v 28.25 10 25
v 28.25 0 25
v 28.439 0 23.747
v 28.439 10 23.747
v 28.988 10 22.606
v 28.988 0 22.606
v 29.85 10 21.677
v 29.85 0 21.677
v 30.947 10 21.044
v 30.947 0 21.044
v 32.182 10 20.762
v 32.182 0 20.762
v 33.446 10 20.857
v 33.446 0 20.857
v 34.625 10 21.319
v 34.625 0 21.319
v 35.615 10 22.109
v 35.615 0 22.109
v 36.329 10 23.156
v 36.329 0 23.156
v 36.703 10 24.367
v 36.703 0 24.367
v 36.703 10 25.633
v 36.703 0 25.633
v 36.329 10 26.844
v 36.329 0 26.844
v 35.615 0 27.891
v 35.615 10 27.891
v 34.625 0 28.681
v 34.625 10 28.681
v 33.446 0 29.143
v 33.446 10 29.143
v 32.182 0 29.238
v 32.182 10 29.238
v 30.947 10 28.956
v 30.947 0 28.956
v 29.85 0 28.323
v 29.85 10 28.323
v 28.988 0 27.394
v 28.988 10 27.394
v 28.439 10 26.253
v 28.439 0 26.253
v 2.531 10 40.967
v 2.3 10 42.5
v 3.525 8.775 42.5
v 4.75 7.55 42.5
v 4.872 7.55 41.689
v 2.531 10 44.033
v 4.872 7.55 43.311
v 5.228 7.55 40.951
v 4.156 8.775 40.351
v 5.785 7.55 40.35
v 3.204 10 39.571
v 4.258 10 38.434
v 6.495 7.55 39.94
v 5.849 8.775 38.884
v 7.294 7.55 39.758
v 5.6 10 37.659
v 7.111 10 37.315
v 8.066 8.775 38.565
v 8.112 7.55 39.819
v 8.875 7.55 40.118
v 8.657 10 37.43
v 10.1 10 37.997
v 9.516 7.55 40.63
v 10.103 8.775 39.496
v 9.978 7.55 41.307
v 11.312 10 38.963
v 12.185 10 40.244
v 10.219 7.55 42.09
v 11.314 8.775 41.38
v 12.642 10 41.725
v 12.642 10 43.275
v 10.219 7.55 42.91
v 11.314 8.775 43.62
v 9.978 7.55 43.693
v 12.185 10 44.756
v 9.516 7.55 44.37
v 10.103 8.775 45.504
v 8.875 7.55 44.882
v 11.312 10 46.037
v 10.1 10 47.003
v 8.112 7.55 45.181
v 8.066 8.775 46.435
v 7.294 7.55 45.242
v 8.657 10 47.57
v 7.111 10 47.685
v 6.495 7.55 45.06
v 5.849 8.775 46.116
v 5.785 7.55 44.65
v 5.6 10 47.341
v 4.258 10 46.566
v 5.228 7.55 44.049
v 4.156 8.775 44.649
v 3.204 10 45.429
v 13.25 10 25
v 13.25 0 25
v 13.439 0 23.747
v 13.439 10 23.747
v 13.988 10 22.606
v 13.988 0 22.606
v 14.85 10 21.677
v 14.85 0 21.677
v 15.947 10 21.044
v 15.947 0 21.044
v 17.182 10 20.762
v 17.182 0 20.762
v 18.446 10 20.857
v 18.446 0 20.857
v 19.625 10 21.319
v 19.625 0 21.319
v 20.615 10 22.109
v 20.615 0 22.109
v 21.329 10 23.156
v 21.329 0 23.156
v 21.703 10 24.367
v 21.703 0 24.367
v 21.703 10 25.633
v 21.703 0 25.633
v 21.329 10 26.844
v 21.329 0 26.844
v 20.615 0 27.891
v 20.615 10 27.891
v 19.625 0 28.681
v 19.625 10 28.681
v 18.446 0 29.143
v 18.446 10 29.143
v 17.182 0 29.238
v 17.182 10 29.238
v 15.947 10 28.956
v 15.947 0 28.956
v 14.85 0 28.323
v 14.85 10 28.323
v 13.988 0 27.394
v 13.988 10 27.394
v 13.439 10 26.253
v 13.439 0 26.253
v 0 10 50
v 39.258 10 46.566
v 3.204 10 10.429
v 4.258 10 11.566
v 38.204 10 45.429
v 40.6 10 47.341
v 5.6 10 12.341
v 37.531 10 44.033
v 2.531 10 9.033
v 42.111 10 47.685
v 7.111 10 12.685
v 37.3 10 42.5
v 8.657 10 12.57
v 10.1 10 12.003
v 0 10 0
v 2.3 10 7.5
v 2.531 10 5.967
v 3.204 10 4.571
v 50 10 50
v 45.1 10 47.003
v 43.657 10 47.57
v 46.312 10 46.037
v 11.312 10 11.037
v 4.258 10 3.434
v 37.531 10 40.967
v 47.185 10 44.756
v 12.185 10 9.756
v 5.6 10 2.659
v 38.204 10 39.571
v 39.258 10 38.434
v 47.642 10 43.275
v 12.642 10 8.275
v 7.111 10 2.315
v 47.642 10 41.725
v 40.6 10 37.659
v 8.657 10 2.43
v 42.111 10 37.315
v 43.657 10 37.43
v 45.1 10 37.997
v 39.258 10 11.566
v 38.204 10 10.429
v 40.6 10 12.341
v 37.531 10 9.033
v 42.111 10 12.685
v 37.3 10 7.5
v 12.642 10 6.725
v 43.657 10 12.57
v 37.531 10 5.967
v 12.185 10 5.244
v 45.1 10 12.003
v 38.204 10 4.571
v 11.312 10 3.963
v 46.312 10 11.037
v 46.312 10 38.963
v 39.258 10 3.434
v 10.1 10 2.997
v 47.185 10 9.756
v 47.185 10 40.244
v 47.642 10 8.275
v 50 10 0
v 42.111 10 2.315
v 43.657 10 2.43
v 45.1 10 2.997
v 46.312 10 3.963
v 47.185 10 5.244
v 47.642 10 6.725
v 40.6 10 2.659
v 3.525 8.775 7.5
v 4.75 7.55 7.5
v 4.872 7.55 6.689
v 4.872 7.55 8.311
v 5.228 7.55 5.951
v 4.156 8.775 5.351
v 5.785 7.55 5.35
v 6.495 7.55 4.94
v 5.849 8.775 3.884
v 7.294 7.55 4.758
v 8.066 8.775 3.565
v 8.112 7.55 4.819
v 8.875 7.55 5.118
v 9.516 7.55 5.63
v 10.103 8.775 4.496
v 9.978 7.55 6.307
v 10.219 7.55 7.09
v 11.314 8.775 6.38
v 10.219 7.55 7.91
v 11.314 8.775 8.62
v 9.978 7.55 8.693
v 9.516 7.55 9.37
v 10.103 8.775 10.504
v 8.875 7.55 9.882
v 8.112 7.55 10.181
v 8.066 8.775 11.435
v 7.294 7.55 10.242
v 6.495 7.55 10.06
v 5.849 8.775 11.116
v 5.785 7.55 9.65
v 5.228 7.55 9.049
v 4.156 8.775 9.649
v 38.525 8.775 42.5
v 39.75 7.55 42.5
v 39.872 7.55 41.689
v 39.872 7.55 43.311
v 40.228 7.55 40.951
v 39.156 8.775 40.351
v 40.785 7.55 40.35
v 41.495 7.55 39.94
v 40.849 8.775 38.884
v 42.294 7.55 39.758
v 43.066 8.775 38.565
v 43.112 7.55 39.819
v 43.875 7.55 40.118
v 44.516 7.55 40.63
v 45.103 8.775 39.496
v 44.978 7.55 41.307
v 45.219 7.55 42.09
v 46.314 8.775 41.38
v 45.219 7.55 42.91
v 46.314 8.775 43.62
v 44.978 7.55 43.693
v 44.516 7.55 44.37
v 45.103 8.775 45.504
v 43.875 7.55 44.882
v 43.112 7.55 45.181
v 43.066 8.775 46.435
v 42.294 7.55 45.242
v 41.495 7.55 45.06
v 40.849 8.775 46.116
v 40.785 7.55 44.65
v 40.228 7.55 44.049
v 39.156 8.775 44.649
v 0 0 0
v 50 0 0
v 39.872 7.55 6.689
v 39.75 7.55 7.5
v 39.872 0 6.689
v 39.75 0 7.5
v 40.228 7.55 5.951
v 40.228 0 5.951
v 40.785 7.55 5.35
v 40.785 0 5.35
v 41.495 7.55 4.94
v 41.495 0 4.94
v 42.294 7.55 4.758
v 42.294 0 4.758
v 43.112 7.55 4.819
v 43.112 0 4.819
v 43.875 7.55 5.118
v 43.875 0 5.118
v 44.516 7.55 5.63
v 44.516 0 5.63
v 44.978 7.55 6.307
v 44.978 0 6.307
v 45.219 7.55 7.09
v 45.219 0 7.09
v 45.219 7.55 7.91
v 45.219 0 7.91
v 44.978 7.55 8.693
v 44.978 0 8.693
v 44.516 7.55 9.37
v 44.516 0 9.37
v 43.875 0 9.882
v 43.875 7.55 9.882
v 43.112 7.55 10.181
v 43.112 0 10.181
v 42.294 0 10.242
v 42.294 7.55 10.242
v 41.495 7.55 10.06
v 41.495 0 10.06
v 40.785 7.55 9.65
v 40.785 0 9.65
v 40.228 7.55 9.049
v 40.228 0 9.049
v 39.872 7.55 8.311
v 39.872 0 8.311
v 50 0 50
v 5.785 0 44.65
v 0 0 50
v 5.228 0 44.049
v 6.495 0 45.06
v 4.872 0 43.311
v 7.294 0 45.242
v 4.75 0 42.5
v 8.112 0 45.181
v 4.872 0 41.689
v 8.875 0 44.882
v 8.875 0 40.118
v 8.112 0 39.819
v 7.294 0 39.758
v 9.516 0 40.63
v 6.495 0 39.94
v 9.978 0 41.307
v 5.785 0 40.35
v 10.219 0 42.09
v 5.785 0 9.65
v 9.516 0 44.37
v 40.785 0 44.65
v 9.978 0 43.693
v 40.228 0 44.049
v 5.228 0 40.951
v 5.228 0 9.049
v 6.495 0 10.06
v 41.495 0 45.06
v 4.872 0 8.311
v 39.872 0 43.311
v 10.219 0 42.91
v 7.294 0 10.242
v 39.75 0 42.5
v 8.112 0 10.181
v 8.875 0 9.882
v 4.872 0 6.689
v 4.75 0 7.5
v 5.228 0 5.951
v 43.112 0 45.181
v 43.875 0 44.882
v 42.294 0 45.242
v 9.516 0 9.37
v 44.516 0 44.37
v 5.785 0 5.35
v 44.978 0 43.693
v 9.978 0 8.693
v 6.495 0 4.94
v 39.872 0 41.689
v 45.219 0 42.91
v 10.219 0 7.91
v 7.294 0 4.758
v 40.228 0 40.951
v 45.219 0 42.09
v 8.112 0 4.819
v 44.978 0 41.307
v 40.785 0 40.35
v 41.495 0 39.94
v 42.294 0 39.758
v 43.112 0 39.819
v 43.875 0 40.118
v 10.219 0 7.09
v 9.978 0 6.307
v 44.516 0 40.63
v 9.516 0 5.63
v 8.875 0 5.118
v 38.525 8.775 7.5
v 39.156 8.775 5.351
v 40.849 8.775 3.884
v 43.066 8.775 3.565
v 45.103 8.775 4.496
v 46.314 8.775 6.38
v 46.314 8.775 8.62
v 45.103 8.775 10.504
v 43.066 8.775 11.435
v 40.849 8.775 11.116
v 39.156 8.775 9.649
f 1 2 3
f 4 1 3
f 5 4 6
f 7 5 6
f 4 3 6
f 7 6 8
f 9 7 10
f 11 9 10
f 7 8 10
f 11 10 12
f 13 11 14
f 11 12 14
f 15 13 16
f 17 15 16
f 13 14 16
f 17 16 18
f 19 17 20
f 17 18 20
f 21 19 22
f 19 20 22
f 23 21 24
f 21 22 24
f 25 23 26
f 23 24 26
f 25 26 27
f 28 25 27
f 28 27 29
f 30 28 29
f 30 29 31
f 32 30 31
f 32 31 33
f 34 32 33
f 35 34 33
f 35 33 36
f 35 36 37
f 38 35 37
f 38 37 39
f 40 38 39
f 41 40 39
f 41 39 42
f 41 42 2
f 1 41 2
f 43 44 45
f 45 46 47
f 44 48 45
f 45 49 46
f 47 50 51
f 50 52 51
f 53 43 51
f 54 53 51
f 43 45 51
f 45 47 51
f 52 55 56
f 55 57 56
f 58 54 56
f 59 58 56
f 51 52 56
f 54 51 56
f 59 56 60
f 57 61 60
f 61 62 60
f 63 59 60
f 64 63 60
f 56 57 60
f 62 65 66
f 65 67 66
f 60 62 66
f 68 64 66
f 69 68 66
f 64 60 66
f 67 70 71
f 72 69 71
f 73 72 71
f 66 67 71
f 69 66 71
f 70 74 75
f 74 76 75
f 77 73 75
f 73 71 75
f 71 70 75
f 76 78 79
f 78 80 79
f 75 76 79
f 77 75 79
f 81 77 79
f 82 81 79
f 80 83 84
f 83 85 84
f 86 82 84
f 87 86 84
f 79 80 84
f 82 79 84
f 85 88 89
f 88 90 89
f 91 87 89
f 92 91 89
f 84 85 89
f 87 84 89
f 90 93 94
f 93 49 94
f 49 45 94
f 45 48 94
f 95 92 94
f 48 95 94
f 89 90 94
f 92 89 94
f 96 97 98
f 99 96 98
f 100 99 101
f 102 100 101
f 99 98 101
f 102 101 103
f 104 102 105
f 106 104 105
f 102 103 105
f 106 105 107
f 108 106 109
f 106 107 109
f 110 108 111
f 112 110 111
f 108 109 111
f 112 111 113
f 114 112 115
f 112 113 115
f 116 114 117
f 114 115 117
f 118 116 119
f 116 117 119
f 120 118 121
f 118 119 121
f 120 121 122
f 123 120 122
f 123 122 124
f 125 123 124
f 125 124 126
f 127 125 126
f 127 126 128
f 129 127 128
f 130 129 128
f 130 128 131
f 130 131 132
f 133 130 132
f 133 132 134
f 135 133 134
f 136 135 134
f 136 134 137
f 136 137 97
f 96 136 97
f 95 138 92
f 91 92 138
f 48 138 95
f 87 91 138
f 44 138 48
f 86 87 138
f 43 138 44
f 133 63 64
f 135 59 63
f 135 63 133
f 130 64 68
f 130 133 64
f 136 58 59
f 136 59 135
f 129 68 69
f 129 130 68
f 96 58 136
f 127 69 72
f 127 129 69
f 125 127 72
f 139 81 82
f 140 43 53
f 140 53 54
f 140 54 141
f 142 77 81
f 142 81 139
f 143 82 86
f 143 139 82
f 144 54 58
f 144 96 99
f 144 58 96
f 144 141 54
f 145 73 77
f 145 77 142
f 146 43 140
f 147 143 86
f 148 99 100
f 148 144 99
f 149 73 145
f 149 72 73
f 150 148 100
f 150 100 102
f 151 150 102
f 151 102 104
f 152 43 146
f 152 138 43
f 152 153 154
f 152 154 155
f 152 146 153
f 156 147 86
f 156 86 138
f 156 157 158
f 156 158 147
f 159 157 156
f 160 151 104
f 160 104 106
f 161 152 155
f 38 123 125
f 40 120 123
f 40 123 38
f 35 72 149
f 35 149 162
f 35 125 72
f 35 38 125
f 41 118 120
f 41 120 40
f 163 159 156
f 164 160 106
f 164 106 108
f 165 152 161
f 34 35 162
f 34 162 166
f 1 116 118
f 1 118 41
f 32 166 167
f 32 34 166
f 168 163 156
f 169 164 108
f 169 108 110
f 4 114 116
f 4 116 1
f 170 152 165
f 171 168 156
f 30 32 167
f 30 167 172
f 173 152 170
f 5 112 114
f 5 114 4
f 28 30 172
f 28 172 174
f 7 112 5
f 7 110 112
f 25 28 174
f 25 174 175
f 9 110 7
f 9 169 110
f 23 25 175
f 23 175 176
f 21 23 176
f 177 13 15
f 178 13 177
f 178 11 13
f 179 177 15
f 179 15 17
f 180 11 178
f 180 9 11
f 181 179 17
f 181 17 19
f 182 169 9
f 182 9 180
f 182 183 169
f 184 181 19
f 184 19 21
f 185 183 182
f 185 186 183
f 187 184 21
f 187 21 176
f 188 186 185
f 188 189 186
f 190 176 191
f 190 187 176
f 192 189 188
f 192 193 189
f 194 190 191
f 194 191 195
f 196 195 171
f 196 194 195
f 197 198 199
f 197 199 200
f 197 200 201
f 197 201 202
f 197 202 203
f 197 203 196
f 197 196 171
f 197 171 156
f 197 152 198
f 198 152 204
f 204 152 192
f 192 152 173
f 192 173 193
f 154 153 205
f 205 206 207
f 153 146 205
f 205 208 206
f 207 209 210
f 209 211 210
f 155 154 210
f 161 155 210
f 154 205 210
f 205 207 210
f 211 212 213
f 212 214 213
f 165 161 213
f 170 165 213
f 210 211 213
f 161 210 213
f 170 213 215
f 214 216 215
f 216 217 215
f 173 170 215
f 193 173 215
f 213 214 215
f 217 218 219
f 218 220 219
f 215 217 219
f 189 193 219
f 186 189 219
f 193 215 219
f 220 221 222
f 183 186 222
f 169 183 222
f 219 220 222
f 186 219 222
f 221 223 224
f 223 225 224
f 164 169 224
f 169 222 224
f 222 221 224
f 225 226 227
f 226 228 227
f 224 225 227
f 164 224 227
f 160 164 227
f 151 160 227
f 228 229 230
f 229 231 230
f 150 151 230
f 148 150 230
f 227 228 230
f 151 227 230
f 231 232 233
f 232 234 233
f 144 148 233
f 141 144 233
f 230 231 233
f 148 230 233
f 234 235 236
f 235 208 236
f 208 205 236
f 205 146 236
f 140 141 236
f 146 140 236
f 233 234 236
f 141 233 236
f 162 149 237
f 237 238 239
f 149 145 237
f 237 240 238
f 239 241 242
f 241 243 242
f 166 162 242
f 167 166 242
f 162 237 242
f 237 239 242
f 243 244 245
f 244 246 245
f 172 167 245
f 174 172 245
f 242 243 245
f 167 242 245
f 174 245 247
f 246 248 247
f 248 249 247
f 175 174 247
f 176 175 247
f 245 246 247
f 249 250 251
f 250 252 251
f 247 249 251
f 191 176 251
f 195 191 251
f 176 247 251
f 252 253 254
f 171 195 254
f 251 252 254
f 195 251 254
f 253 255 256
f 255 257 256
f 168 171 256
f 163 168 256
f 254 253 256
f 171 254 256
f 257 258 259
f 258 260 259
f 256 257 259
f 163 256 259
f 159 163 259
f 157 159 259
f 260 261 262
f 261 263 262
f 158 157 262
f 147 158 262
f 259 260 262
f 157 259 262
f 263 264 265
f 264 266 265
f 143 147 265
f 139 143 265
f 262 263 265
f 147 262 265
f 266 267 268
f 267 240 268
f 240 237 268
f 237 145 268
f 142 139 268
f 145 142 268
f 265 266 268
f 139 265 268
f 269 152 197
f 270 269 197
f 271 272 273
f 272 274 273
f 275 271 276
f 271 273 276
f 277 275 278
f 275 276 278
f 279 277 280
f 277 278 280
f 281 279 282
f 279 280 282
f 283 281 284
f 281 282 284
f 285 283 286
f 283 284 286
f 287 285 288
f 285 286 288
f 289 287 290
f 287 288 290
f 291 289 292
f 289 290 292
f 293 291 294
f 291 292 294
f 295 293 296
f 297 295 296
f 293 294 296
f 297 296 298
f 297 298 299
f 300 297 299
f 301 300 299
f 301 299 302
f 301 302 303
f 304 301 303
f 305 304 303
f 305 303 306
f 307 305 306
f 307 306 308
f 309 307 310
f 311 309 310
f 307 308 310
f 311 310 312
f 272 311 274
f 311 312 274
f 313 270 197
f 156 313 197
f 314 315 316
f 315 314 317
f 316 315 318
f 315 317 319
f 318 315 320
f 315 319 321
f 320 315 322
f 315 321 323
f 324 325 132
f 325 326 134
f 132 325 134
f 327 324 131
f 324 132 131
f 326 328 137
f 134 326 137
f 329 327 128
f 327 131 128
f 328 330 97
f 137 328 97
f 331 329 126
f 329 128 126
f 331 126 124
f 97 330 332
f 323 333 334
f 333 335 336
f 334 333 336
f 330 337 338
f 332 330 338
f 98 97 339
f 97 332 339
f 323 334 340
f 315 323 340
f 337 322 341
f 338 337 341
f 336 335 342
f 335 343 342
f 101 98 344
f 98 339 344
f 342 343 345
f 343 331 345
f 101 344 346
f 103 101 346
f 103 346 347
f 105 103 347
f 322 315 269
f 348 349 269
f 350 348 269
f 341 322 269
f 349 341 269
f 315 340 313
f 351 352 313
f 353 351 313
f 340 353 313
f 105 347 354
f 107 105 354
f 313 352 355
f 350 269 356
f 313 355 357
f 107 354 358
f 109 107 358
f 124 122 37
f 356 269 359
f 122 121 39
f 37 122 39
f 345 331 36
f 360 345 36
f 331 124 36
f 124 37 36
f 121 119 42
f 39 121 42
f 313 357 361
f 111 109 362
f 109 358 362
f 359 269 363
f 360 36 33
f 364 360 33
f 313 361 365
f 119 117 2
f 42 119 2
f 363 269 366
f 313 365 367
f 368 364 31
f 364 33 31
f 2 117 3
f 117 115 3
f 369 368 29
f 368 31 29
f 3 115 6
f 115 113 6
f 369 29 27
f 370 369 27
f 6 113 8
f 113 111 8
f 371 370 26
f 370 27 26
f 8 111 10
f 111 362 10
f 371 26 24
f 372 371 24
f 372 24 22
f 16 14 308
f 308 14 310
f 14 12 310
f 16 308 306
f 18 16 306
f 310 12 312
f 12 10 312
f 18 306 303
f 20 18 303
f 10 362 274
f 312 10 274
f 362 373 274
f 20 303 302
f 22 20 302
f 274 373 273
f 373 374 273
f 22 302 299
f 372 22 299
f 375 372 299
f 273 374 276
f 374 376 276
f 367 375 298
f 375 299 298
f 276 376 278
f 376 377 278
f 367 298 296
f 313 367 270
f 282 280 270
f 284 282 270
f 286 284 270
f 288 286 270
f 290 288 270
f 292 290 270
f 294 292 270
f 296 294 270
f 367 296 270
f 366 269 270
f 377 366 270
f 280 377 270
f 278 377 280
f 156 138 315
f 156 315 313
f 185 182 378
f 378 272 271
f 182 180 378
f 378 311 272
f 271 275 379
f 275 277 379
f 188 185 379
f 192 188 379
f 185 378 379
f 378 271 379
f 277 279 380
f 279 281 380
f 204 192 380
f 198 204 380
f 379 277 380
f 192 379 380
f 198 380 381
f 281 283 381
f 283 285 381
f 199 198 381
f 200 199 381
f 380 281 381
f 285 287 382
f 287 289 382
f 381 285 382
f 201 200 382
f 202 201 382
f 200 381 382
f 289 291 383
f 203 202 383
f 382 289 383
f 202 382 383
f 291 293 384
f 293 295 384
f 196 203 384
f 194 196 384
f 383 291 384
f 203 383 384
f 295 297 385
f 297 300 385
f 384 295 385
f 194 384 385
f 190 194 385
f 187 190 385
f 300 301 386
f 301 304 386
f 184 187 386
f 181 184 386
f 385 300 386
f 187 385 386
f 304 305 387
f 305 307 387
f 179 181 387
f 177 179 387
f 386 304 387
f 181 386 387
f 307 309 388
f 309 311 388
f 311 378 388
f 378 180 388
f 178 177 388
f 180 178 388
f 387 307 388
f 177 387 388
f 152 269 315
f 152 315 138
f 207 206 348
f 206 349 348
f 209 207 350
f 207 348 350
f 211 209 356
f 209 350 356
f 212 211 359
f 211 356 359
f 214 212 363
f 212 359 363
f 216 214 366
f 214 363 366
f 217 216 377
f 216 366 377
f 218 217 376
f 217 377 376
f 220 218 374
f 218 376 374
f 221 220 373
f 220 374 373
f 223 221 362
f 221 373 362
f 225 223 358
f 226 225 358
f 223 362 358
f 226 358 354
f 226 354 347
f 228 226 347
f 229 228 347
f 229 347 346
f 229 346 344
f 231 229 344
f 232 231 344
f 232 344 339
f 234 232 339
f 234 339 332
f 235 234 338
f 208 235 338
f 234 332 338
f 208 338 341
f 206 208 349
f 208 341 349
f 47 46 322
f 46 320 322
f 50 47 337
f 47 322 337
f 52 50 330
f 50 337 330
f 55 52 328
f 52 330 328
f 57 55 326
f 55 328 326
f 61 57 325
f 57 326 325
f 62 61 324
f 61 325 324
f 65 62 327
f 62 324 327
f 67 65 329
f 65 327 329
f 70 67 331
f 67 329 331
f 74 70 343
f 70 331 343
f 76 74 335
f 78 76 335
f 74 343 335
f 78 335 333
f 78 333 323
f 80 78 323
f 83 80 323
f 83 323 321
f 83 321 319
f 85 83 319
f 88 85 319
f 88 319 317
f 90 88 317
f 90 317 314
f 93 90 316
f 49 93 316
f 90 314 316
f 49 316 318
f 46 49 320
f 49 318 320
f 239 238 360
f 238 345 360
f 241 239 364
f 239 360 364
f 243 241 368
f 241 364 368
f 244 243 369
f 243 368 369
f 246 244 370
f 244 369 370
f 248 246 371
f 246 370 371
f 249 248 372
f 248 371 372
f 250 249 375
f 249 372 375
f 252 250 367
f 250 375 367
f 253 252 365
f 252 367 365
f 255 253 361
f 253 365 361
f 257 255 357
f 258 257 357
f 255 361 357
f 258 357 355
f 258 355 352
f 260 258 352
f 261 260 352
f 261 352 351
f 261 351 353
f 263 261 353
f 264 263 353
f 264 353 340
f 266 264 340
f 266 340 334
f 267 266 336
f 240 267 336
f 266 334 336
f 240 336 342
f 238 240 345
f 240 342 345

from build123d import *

# Parameters (mm, degrees)
SKETCH2_W                                       = 50
SKETCH2_H                                       = 10
BOSS_EXTRUDE1_DEPTH                             = 50
TAP_DRILL_FOR_M10_TAP1_D                        = 8.5
CSK_FOR_M5_FLAT_HEAD_MACHINE_SCREW2_D           = 5.5
CSK_FOR_M5_FLAT_HEAD_MACHINE_SCREW2_CSINK_D     = 10.4
CSK_FOR_M5_FLAT_HEAD_MACHINE_SCREW2_CSINK_ANGLE = 90


with BuildPart() as part:
    # Sketch2 → Boss-Extrude1 (new body)
    with BuildSketch(Plane.XY):
        with Locations((25, 5)):
            Rectangle(SKETCH2_W, SKETCH2_H)
    extrude(amount=BOSS_EXTRUDE1_DEPTH)

    # Tap Drill for M10 Tap1 (through all)
    with Locations(Plane(origin=(0, 10, 0), x_dir=(1, 0, 0), z_dir=(0, 1, 0))):
        with Locations((17.5, -25), (32.5, -25)):
            Hole(TAP_DRILL_FOR_M10_TAP1_D / 2)

    # CSK for M5 Flat Head Machine Screw2 (through all)
    with Locations(Plane(origin=(0, 10, 0), x_dir=(1, 0, 0), z_dir=(0, 1, 0))):
        with Locations((7.5, -7.5), (42.5, -7.5), (42.5, -42.5), (7.5, -42.5)):
            CounterSinkHole(CSK_FOR_M5_FLAT_HEAD_MACHINE_SCREW2_D / 2, CSK_FOR_M5_FLAT_HEAD_MACHINE_SCREW2_CSINK_D / 2, counter_sink_angle=CSK_FOR_M5_FLAT_HEAD_MACHINE_SCREW2_CSINK_ANGLE)


solid = part.part
